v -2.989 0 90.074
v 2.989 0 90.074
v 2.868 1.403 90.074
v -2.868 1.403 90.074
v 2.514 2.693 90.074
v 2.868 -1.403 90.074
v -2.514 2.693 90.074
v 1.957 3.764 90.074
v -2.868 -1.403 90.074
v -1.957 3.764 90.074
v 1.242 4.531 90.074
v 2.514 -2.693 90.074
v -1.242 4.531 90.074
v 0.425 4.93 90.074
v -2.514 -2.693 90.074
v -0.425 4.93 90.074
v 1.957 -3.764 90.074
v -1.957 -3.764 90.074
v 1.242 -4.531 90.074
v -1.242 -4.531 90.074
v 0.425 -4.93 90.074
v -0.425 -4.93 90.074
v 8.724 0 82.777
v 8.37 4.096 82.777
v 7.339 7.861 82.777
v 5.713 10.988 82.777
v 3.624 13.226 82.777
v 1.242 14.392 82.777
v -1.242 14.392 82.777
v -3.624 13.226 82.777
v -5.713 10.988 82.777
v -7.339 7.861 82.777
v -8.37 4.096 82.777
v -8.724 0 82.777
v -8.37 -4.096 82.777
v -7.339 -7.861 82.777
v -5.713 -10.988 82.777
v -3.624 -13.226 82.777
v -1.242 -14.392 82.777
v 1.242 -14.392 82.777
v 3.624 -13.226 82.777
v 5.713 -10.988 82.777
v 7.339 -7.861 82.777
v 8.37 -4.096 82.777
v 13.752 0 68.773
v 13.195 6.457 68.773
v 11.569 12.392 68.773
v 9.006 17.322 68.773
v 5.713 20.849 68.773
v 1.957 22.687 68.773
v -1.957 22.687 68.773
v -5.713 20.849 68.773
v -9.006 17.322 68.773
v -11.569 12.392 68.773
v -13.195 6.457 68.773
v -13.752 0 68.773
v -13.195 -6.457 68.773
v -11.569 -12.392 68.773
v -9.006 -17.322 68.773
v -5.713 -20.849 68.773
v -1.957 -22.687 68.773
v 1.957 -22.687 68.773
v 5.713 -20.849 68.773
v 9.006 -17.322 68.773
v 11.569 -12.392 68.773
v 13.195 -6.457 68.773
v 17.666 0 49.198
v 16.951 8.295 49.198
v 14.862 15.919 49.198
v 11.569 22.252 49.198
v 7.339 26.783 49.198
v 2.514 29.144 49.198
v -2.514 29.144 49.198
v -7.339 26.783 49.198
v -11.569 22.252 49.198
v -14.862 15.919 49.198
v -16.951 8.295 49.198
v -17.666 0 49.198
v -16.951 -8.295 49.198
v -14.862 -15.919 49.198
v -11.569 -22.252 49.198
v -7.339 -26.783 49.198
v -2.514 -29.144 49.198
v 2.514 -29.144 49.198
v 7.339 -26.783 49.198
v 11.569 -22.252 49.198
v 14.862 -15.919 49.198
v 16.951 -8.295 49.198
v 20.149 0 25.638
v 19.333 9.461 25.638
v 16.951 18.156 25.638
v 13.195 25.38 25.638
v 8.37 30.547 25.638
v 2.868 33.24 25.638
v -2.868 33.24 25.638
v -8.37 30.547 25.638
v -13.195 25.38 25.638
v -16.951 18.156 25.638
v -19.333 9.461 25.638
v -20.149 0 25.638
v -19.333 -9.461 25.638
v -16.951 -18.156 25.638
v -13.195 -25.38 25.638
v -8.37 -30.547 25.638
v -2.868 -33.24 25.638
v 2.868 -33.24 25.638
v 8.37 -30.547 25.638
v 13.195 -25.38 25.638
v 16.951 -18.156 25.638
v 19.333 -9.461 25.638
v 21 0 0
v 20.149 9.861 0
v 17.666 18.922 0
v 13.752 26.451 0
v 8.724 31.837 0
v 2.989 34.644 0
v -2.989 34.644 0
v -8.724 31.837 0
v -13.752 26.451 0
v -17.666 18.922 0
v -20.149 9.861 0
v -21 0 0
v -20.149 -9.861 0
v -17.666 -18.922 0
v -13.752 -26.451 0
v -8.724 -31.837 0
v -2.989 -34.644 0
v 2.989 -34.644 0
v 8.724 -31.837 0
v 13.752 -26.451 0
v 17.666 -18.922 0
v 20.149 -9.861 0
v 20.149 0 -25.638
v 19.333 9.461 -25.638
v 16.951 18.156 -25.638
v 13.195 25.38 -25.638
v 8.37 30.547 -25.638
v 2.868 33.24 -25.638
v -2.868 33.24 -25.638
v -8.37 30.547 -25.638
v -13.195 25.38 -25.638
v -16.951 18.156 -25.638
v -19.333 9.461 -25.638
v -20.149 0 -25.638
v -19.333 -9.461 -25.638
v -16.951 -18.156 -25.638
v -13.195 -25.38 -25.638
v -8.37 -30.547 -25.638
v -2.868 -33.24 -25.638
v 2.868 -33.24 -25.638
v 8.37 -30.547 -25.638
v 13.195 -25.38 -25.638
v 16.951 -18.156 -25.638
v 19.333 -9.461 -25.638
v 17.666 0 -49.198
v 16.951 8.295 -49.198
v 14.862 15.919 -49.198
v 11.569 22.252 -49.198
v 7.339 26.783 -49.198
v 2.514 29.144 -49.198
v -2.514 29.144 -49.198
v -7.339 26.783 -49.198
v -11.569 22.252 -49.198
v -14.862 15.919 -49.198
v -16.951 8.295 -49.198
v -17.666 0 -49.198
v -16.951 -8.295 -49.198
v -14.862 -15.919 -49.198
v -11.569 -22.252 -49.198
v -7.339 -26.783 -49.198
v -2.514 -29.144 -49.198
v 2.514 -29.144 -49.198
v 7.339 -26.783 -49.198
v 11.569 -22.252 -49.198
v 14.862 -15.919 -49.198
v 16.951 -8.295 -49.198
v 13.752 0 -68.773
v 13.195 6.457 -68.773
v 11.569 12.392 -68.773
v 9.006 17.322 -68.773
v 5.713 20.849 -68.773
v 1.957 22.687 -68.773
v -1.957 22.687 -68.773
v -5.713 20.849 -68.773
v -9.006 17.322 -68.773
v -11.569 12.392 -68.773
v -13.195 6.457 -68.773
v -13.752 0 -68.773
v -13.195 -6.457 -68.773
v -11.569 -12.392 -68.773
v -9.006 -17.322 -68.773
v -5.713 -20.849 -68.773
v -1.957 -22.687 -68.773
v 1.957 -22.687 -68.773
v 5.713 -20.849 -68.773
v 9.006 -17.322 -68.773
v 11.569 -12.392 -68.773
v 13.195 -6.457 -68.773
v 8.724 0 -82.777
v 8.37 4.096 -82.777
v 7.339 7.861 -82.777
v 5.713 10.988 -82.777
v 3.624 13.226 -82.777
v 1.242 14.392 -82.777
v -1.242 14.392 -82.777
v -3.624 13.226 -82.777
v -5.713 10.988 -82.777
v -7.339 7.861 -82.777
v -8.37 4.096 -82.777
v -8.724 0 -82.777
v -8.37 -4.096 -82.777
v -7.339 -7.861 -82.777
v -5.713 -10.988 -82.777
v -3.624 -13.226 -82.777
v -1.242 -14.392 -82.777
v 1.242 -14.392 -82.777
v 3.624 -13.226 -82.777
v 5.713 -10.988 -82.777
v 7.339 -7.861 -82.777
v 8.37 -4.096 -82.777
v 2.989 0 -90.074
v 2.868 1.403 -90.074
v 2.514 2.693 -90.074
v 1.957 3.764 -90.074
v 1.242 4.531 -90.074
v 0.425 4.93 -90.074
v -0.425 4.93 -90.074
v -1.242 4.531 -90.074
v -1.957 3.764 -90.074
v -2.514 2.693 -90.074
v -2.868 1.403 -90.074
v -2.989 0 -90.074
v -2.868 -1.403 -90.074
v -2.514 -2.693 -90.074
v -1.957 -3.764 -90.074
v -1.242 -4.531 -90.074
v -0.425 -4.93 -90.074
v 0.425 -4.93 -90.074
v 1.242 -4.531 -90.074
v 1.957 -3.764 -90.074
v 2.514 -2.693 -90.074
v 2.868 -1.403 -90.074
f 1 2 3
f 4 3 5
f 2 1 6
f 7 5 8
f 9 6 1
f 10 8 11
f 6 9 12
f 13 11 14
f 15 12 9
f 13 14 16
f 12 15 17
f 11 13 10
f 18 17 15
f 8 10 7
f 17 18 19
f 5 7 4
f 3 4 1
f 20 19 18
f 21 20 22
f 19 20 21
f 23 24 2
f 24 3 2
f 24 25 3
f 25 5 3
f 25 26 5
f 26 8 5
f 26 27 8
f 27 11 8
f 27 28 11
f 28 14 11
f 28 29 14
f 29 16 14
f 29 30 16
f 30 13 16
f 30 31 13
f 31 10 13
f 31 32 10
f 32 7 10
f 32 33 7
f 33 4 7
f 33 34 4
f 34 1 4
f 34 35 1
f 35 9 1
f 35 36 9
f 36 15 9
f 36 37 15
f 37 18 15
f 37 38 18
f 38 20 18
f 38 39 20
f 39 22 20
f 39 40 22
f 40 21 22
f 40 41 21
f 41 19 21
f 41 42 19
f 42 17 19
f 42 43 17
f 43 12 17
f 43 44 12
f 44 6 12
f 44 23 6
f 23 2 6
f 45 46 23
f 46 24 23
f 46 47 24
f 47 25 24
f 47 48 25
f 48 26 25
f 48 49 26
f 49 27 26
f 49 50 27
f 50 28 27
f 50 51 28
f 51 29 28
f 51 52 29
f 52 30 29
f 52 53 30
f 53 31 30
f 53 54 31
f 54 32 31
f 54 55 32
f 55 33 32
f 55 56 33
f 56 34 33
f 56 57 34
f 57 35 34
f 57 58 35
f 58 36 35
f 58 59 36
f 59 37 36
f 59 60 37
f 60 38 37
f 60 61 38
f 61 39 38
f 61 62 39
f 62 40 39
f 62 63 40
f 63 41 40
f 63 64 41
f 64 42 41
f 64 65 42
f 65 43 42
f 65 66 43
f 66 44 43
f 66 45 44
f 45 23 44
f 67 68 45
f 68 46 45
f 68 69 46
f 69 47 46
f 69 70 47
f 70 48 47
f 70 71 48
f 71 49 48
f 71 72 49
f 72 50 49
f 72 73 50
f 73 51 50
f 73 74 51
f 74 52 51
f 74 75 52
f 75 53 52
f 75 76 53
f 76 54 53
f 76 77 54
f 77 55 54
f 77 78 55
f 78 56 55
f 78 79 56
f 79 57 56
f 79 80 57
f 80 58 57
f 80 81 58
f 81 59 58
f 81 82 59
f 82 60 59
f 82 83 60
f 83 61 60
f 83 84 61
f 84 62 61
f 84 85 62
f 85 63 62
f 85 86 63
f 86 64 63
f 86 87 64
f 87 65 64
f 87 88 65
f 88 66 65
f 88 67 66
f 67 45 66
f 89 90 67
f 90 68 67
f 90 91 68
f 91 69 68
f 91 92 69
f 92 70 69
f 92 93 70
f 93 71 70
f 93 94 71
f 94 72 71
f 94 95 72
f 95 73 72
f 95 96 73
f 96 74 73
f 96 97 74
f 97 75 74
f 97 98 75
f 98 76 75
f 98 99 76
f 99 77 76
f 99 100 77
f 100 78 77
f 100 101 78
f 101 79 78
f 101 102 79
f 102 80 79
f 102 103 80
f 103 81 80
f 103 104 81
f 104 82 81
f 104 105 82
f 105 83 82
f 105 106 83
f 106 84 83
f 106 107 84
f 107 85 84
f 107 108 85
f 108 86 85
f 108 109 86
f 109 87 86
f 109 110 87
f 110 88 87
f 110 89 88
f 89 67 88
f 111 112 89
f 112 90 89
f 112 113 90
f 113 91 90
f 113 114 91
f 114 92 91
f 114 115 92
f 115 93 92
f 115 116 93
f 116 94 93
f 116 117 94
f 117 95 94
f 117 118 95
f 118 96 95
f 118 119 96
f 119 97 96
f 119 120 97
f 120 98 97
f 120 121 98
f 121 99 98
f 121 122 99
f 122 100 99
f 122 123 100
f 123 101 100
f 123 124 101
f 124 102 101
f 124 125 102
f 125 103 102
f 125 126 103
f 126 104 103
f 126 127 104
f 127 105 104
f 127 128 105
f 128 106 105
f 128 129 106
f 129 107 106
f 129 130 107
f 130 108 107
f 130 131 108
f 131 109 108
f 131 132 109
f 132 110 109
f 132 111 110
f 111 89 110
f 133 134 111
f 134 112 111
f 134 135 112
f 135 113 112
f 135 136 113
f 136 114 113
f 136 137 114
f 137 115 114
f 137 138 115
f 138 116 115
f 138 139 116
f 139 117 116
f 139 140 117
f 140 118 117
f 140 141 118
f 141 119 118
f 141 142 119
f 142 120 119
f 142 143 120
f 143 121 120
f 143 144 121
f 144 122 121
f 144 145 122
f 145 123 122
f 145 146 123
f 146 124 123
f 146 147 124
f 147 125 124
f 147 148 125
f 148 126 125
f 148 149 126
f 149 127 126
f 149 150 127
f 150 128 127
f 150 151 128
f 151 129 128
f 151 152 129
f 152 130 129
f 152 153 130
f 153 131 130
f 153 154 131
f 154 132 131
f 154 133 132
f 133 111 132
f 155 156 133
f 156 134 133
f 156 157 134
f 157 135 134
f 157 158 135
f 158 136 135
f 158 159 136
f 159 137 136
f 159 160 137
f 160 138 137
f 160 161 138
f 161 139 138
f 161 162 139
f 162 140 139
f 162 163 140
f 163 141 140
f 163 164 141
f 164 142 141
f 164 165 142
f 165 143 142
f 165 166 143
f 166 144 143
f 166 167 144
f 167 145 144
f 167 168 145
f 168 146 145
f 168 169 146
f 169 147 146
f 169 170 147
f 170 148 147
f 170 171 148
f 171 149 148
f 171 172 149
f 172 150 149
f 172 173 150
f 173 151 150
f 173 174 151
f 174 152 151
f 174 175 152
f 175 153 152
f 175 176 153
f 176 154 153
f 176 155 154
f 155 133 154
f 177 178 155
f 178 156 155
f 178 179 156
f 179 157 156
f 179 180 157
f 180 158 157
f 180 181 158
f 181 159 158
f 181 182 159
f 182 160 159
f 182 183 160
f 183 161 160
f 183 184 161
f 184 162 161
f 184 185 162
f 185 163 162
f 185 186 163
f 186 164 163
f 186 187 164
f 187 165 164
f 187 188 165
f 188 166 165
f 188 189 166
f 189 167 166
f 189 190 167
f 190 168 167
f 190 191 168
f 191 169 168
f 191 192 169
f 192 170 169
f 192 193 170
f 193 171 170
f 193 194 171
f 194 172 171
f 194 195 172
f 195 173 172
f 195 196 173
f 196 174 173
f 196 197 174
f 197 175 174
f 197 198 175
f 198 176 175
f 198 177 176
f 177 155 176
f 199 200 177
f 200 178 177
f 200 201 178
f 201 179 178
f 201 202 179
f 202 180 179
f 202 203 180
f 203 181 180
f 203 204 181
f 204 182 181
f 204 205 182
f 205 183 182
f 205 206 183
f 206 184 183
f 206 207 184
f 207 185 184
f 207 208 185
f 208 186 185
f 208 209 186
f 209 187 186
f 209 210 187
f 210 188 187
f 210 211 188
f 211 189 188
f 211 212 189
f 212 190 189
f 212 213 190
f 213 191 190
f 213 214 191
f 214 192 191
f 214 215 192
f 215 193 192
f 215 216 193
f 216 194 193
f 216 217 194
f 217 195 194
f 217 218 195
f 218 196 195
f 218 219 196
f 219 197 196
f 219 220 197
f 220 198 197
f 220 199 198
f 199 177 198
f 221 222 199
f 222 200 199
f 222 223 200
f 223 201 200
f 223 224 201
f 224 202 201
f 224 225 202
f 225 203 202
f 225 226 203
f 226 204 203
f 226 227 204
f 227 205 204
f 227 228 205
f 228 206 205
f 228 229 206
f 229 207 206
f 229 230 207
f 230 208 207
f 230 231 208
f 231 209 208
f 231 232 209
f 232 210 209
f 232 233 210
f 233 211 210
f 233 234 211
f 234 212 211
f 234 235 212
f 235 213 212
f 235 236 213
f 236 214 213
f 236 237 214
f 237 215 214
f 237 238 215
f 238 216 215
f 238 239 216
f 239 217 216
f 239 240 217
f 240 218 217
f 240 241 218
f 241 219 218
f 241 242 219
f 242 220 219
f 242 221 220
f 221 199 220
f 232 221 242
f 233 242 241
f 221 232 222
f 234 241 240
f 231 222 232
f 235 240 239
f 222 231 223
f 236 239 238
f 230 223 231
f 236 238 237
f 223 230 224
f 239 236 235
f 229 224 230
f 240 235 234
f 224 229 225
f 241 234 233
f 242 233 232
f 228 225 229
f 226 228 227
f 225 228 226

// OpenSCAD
// Generated by SolidPython 1.0.1 on 2020-07-29 00:46:45


scale(v = [3, 5, 13]) {
	sphere(r = 7);
}
/***********************************************
*********      SolidPython code:      **********
************************************************
 
# import packages: SolidPython
from solid import *
from solid.utils import *
from itertools import chain, combinations, permutations


class Resize:

    def __init__(self, scad_file):
        self.scad_file = scad_file
        #self.scad_file = import_scad(scad_file)
        # cone/cylinder param:
        self.r1 = 0
        self.r2 = 0
        self.h = 0
        # rectangular prism param:
        self.w = 0
        self.l = 0
        # ellipse param:
        self.r = 0

    # import OpenScad code (file name corresponds to shape)


    # classify shape + parameters
    def assign(self, param1, param2, param3):
        if self.scad_file == 'cone.scad':
            self.r1 = param1
            self.r2 = param2
            self.h = param3
        elif self.scad_file == 'cylinder.scad':
            self.r1 = param1
            self.r2 = param2
            self.h = param3
        elif self.scad_file == 'rectangularPrism.scad':
            self.h = param1
            self.l = param2
            self.w = param3
        else:
            self.r = param1
            self.h = param2

    # resize parameters
    def iterate(self):
        x = range(3, 20, 2)
        i = 1
        if self.scad_file == 'cone.scad':
            tempList = list(permutations(x, 2))
            for temp in tempList:
                param1 = temp[0]
                param2 = temp[1]
                filepath = 'produced_scad_files/' + 'cone' + str(param1) + '_' + str(param2) + '_' + '.scad'
                scad_render_to_file(cylinder(h=param1, r1=param2, r2=0), filepath)

        elif self.scad_file == 'cylinder.scad':
            tempList = list(permutations(x, 3))
            for temp in tempList:
                param1 = temp[0]
                param2 = temp[1]
                filepath = 'produced_scad_files/' + 'cylinder' + str(param1) + '_' + str(param2) + '_' + '.scad'
                scad_render_to_file(cylinder(h=param1, r1=param2, r2=param2), filepath)

        elif self.scad_file == 'rectangularPrism.scad':
            tempList = list(permutations(x, 3))
            for temp in tempList:
                param1 = temp[0]
                param2 = temp[1]
                param3 = temp[2]
                filepath = 'produced_scad_files/' + 'rectangularPrism' + str(param1) + '_' + str(param2) + '_' + str(
                    param3) + '.scad'
                scad_render_to_file(cube(size=(param1, param2, param3)), filepath)

        elif self.scad_file == 'ellipse.scad':
            tempList = list(permutations(x, 4))
            for temp in tempList:
                param1 = temp[0]
                param2 = temp[1]
                param3 = temp[2]
                param4 = temp[3]
                filepath = 'produced_scad_files/' + 'ellipse' + str(param1) + '_' + str(param2) + '_' + str(param3) + '_' + str(param4) + '.scad'
                scad_render_to_file(scale([param1, param2, param3])(sphere(r=param4)), filepath)

    def render_to_scadfile(self):
        scad_render_to_file(scad, 'example.scad') 
 
************************************************/
